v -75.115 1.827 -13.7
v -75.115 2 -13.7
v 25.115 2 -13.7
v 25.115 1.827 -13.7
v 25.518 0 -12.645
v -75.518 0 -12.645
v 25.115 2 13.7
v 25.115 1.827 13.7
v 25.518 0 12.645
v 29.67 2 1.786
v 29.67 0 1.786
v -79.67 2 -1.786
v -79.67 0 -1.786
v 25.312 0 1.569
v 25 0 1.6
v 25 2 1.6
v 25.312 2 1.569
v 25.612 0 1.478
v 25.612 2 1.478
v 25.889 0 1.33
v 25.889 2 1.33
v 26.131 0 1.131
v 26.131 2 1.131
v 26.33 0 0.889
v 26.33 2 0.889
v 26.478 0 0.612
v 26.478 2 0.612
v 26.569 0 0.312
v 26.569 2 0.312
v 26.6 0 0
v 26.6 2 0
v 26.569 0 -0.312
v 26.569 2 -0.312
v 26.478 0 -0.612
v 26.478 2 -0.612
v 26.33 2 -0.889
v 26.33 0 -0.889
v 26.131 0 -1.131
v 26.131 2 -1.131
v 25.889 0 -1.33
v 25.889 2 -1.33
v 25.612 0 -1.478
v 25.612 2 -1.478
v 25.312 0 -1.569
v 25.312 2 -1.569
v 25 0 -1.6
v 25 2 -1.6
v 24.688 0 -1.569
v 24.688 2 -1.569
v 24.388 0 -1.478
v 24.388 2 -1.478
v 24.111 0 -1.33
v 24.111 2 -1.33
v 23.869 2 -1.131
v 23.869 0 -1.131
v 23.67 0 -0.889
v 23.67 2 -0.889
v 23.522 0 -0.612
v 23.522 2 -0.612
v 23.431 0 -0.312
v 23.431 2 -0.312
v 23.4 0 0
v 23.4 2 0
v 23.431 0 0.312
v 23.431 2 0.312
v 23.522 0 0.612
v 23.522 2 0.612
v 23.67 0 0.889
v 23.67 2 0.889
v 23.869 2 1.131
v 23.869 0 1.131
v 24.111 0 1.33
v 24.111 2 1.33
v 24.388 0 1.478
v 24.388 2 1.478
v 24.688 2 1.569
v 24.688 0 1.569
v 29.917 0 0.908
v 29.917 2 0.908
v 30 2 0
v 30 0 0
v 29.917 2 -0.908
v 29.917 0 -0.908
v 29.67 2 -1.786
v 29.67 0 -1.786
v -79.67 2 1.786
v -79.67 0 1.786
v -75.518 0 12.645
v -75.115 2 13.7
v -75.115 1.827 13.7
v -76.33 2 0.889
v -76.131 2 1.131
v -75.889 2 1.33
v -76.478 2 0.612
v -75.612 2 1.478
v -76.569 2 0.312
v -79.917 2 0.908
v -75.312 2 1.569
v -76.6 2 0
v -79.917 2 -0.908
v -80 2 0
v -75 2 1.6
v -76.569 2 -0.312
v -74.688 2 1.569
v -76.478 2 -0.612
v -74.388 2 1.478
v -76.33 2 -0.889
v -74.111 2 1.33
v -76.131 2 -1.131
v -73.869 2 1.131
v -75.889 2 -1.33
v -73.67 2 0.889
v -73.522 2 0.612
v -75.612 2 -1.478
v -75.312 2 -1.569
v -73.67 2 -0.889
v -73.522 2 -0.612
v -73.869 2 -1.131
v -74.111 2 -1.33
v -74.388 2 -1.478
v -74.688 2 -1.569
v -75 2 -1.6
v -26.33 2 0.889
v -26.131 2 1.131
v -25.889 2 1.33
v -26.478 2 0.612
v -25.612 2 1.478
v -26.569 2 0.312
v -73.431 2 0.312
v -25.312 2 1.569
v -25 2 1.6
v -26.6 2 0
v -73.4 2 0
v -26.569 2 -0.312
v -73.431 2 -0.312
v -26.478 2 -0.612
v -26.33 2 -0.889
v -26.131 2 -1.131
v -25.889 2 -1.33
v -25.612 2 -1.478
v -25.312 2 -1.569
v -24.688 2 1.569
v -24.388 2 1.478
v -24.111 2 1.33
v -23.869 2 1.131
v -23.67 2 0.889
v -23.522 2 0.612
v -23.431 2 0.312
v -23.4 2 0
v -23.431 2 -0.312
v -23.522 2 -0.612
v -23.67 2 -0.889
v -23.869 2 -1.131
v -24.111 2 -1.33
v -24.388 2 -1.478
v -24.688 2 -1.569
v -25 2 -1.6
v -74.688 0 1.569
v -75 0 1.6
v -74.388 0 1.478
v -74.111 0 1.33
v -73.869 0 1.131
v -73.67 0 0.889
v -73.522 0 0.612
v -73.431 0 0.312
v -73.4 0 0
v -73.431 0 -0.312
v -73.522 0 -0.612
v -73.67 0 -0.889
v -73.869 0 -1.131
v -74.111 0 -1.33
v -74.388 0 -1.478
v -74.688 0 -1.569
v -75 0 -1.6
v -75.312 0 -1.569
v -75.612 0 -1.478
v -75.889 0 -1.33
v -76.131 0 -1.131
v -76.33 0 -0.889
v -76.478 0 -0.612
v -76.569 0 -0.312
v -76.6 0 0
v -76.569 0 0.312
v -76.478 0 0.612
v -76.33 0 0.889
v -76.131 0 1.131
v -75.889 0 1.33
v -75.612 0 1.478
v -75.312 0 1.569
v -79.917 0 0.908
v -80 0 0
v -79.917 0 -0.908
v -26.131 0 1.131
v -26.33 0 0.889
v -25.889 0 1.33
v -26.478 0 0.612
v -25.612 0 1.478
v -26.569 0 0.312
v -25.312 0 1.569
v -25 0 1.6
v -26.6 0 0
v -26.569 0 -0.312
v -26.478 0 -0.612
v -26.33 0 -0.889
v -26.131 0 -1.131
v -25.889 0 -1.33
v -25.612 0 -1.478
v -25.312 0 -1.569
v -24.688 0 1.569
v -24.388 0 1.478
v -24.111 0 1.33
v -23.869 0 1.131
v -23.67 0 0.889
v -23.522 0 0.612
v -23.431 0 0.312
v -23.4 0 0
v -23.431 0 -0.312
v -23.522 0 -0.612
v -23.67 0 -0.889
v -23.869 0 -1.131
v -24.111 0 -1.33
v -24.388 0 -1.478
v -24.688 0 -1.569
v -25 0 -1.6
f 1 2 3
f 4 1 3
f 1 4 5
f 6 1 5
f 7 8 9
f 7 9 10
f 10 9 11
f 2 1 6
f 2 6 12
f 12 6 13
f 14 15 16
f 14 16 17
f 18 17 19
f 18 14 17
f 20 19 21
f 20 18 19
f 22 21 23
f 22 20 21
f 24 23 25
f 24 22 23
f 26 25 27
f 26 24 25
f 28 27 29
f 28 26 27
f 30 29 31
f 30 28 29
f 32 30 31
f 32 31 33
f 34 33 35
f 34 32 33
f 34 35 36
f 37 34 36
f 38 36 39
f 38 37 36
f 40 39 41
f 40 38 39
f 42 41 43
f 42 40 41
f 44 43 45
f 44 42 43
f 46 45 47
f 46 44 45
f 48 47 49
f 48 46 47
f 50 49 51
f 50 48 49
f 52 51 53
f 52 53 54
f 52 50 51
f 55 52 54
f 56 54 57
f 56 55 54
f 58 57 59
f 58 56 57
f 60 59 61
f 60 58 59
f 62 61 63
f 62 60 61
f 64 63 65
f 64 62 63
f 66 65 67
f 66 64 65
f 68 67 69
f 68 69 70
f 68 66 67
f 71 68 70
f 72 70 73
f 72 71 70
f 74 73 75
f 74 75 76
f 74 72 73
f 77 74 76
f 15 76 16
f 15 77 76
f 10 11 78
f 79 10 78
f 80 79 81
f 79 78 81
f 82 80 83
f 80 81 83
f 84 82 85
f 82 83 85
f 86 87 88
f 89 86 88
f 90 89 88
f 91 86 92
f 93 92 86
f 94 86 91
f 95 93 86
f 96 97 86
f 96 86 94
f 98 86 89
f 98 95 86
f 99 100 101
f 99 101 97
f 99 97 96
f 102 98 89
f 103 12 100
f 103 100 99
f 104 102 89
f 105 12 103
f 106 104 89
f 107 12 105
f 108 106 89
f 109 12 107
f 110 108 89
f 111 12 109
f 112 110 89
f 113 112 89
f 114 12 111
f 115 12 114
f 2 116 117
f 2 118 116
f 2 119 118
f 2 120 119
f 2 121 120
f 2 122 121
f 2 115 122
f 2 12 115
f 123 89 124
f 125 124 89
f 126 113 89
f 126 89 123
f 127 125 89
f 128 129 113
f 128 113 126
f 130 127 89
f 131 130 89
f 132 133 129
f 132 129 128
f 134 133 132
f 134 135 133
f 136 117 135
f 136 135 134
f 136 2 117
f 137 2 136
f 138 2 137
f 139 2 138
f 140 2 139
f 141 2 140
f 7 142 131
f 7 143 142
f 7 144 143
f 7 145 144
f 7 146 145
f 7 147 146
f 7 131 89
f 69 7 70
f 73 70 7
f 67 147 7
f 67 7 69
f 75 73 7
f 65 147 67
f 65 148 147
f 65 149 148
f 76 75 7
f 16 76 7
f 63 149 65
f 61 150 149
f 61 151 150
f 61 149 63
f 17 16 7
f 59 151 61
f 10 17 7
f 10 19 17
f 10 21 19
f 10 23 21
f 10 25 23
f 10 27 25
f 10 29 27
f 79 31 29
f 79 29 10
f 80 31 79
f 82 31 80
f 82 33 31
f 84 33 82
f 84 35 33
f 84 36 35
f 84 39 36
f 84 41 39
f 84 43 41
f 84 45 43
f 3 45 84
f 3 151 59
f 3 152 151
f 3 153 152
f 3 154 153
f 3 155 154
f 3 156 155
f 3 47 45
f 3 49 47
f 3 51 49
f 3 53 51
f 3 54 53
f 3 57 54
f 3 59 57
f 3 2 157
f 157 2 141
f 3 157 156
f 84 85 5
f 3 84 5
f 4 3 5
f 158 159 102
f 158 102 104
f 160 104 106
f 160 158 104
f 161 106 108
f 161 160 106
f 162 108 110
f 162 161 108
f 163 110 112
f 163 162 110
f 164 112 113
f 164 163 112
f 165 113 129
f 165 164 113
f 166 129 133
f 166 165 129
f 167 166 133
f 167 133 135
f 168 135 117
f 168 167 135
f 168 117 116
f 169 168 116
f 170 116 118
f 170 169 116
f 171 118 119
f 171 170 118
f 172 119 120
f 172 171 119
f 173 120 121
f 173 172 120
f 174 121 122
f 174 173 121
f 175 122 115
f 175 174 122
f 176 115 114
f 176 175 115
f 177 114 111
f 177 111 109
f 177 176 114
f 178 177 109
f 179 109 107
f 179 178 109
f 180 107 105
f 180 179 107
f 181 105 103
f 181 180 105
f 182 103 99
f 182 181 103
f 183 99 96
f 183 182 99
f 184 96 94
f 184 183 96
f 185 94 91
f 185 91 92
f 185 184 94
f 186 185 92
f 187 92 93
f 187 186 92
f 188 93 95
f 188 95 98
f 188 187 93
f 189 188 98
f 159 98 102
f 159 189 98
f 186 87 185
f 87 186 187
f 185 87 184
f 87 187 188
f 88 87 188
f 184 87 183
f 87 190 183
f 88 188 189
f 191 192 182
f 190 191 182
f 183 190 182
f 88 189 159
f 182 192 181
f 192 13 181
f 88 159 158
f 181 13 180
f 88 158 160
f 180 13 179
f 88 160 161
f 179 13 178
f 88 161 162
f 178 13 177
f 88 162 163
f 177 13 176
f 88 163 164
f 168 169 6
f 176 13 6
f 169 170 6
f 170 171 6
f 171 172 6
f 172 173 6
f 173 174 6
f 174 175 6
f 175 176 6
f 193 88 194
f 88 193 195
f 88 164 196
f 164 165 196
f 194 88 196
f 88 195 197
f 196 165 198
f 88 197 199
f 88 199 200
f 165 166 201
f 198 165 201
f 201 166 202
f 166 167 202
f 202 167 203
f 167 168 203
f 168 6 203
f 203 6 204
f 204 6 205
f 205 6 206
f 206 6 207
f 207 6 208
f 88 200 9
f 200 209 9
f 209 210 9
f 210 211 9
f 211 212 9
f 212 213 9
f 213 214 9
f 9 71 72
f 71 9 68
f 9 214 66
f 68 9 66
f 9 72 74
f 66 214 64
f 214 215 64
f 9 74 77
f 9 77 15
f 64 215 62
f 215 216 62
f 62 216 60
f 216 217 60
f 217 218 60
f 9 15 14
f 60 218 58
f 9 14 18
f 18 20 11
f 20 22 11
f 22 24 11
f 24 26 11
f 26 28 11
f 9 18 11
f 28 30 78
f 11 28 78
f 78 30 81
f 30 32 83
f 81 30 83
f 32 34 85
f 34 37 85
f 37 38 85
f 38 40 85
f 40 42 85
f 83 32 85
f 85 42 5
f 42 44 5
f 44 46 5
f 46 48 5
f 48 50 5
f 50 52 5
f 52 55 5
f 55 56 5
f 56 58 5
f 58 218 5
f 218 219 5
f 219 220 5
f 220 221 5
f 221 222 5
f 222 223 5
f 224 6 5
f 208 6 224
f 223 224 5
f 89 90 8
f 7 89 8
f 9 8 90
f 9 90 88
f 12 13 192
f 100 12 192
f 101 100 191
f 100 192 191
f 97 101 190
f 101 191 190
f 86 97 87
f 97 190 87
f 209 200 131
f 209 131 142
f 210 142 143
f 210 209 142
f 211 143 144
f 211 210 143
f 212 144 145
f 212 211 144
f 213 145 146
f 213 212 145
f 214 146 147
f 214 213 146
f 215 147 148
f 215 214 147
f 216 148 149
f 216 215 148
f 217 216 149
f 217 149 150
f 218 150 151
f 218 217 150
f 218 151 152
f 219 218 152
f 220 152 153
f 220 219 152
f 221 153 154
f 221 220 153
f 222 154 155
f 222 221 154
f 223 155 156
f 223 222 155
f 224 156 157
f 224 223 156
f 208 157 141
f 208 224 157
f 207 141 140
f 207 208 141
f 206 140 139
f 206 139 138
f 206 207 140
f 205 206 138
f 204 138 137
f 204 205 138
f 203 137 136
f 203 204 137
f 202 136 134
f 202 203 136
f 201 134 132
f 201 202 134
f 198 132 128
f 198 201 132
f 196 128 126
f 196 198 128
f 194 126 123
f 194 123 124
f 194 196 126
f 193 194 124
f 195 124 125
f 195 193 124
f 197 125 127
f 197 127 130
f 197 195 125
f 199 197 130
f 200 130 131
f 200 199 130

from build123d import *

# Parameters (mm, degrees)
SKETCH_1_R          = 1.6
EXTRUDE_1_DEPTH     = 2
CUT_EXTRUDE_1_DEPTH = 111.905365064
CHAMFER_1_SIZE      = 0.2
CHAMFER_1_SIZE2     = 0.1
CHAMFER_2_SIZE2     = 0.2
CHAMFER_2_SIZE      = 0.1


with BuildPart() as part:
    # Эскиз1 → Бобышка-Вытянуть1 (new body)
    with BuildSketch(Plane(origin=(0, 0, 0), x_dir=(1, 0, 0), z_dir=(0, 1, 0))):
        with BuildLine():
            Line((-75, 14), (-79.670248868, 1.785714286))
            ThreePointArc((-79.670248868, 1.785714286), (-80, 0), (-79.670248868, -1.785714286))
            Line((-79.670248868, -1.785714286), (-75, -14))
            Line((-75, -14), (25, -14))
            Line((25, -14), (29.670248868, -1.785714286))
            ThreePointArc((29.670248868, -1.785714286), (30, 0), (29.670248868, 1.785714286))
            Line((29.670248868, 1.785714286), (25, 14))
            Line((25, 14), (-75, 14))
        make_face()
        with Locations(Location((-75, 0, 0), (0, 0, 270))):
            Circle(SKETCH_1_R, mode=Mode.SUBTRACT)
        with Locations(Location((-25, 0, 0), (0, 0, 270))):
            Circle(SKETCH_1_R, mode=Mode.SUBTRACT)
        with Locations(Location((25, 0, 0), (0, 0, 270))):
            Circle(SKETCH_1_R, mode=Mode.SUBTRACT)
    extrude(amount=EXTRUDE_1_DEPTH)

    # Эскиз3 → Вырез-Вытянуть1 (cut, through all)
    with BuildSketch(Plane.ZY.offset(80)):
        Polygon((-13.8, 2), (-12.645299462, 0), (-14, 0), (-14, 2), align=None)
        Polygon((13.8, 2), (12.645299462, 0), (14, 0), (14, 2), align=None)
    extrude(amount=-CUT_EXTRUDE_1_DEPTH, mode=Mode.SUBTRACT)

    # Фаска1
    chamfer_1_edges = [part.edges().sort_by_distance(p)[0] for p in [
        (-25, 2, -13.8),
    ]]
    chamfer_1_side = [part.faces().sort_by_distance(p)[0] for p in [
        (-25, 0.998536994, -13.221805064),
    ]]
    chamfer(chamfer_1_edges, length=CHAMFER_1_SIZE, length2=CHAMFER_1_SIZE2, reference=chamfer_1_side[0])

    # Фаска2
    chamfer_2_edges = [part.edges().sort_by_distance(p)[0] for p in [
        (-25, 2, 13.8),
    ]]
    chamfer_2_side = [part.faces().sort_by_distance(p)[0] for p in [
        (-25, 2, 13.798),
    ]]
    chamfer(chamfer_2_edges, length=CHAMFER_2_SIZE - 0.0001, length2=CHAMFER_2_SIZE2 - 0.0001, reference=chamfer_2_side[0])  # a hair under: the kernel refuses the full size


solid = part.part
